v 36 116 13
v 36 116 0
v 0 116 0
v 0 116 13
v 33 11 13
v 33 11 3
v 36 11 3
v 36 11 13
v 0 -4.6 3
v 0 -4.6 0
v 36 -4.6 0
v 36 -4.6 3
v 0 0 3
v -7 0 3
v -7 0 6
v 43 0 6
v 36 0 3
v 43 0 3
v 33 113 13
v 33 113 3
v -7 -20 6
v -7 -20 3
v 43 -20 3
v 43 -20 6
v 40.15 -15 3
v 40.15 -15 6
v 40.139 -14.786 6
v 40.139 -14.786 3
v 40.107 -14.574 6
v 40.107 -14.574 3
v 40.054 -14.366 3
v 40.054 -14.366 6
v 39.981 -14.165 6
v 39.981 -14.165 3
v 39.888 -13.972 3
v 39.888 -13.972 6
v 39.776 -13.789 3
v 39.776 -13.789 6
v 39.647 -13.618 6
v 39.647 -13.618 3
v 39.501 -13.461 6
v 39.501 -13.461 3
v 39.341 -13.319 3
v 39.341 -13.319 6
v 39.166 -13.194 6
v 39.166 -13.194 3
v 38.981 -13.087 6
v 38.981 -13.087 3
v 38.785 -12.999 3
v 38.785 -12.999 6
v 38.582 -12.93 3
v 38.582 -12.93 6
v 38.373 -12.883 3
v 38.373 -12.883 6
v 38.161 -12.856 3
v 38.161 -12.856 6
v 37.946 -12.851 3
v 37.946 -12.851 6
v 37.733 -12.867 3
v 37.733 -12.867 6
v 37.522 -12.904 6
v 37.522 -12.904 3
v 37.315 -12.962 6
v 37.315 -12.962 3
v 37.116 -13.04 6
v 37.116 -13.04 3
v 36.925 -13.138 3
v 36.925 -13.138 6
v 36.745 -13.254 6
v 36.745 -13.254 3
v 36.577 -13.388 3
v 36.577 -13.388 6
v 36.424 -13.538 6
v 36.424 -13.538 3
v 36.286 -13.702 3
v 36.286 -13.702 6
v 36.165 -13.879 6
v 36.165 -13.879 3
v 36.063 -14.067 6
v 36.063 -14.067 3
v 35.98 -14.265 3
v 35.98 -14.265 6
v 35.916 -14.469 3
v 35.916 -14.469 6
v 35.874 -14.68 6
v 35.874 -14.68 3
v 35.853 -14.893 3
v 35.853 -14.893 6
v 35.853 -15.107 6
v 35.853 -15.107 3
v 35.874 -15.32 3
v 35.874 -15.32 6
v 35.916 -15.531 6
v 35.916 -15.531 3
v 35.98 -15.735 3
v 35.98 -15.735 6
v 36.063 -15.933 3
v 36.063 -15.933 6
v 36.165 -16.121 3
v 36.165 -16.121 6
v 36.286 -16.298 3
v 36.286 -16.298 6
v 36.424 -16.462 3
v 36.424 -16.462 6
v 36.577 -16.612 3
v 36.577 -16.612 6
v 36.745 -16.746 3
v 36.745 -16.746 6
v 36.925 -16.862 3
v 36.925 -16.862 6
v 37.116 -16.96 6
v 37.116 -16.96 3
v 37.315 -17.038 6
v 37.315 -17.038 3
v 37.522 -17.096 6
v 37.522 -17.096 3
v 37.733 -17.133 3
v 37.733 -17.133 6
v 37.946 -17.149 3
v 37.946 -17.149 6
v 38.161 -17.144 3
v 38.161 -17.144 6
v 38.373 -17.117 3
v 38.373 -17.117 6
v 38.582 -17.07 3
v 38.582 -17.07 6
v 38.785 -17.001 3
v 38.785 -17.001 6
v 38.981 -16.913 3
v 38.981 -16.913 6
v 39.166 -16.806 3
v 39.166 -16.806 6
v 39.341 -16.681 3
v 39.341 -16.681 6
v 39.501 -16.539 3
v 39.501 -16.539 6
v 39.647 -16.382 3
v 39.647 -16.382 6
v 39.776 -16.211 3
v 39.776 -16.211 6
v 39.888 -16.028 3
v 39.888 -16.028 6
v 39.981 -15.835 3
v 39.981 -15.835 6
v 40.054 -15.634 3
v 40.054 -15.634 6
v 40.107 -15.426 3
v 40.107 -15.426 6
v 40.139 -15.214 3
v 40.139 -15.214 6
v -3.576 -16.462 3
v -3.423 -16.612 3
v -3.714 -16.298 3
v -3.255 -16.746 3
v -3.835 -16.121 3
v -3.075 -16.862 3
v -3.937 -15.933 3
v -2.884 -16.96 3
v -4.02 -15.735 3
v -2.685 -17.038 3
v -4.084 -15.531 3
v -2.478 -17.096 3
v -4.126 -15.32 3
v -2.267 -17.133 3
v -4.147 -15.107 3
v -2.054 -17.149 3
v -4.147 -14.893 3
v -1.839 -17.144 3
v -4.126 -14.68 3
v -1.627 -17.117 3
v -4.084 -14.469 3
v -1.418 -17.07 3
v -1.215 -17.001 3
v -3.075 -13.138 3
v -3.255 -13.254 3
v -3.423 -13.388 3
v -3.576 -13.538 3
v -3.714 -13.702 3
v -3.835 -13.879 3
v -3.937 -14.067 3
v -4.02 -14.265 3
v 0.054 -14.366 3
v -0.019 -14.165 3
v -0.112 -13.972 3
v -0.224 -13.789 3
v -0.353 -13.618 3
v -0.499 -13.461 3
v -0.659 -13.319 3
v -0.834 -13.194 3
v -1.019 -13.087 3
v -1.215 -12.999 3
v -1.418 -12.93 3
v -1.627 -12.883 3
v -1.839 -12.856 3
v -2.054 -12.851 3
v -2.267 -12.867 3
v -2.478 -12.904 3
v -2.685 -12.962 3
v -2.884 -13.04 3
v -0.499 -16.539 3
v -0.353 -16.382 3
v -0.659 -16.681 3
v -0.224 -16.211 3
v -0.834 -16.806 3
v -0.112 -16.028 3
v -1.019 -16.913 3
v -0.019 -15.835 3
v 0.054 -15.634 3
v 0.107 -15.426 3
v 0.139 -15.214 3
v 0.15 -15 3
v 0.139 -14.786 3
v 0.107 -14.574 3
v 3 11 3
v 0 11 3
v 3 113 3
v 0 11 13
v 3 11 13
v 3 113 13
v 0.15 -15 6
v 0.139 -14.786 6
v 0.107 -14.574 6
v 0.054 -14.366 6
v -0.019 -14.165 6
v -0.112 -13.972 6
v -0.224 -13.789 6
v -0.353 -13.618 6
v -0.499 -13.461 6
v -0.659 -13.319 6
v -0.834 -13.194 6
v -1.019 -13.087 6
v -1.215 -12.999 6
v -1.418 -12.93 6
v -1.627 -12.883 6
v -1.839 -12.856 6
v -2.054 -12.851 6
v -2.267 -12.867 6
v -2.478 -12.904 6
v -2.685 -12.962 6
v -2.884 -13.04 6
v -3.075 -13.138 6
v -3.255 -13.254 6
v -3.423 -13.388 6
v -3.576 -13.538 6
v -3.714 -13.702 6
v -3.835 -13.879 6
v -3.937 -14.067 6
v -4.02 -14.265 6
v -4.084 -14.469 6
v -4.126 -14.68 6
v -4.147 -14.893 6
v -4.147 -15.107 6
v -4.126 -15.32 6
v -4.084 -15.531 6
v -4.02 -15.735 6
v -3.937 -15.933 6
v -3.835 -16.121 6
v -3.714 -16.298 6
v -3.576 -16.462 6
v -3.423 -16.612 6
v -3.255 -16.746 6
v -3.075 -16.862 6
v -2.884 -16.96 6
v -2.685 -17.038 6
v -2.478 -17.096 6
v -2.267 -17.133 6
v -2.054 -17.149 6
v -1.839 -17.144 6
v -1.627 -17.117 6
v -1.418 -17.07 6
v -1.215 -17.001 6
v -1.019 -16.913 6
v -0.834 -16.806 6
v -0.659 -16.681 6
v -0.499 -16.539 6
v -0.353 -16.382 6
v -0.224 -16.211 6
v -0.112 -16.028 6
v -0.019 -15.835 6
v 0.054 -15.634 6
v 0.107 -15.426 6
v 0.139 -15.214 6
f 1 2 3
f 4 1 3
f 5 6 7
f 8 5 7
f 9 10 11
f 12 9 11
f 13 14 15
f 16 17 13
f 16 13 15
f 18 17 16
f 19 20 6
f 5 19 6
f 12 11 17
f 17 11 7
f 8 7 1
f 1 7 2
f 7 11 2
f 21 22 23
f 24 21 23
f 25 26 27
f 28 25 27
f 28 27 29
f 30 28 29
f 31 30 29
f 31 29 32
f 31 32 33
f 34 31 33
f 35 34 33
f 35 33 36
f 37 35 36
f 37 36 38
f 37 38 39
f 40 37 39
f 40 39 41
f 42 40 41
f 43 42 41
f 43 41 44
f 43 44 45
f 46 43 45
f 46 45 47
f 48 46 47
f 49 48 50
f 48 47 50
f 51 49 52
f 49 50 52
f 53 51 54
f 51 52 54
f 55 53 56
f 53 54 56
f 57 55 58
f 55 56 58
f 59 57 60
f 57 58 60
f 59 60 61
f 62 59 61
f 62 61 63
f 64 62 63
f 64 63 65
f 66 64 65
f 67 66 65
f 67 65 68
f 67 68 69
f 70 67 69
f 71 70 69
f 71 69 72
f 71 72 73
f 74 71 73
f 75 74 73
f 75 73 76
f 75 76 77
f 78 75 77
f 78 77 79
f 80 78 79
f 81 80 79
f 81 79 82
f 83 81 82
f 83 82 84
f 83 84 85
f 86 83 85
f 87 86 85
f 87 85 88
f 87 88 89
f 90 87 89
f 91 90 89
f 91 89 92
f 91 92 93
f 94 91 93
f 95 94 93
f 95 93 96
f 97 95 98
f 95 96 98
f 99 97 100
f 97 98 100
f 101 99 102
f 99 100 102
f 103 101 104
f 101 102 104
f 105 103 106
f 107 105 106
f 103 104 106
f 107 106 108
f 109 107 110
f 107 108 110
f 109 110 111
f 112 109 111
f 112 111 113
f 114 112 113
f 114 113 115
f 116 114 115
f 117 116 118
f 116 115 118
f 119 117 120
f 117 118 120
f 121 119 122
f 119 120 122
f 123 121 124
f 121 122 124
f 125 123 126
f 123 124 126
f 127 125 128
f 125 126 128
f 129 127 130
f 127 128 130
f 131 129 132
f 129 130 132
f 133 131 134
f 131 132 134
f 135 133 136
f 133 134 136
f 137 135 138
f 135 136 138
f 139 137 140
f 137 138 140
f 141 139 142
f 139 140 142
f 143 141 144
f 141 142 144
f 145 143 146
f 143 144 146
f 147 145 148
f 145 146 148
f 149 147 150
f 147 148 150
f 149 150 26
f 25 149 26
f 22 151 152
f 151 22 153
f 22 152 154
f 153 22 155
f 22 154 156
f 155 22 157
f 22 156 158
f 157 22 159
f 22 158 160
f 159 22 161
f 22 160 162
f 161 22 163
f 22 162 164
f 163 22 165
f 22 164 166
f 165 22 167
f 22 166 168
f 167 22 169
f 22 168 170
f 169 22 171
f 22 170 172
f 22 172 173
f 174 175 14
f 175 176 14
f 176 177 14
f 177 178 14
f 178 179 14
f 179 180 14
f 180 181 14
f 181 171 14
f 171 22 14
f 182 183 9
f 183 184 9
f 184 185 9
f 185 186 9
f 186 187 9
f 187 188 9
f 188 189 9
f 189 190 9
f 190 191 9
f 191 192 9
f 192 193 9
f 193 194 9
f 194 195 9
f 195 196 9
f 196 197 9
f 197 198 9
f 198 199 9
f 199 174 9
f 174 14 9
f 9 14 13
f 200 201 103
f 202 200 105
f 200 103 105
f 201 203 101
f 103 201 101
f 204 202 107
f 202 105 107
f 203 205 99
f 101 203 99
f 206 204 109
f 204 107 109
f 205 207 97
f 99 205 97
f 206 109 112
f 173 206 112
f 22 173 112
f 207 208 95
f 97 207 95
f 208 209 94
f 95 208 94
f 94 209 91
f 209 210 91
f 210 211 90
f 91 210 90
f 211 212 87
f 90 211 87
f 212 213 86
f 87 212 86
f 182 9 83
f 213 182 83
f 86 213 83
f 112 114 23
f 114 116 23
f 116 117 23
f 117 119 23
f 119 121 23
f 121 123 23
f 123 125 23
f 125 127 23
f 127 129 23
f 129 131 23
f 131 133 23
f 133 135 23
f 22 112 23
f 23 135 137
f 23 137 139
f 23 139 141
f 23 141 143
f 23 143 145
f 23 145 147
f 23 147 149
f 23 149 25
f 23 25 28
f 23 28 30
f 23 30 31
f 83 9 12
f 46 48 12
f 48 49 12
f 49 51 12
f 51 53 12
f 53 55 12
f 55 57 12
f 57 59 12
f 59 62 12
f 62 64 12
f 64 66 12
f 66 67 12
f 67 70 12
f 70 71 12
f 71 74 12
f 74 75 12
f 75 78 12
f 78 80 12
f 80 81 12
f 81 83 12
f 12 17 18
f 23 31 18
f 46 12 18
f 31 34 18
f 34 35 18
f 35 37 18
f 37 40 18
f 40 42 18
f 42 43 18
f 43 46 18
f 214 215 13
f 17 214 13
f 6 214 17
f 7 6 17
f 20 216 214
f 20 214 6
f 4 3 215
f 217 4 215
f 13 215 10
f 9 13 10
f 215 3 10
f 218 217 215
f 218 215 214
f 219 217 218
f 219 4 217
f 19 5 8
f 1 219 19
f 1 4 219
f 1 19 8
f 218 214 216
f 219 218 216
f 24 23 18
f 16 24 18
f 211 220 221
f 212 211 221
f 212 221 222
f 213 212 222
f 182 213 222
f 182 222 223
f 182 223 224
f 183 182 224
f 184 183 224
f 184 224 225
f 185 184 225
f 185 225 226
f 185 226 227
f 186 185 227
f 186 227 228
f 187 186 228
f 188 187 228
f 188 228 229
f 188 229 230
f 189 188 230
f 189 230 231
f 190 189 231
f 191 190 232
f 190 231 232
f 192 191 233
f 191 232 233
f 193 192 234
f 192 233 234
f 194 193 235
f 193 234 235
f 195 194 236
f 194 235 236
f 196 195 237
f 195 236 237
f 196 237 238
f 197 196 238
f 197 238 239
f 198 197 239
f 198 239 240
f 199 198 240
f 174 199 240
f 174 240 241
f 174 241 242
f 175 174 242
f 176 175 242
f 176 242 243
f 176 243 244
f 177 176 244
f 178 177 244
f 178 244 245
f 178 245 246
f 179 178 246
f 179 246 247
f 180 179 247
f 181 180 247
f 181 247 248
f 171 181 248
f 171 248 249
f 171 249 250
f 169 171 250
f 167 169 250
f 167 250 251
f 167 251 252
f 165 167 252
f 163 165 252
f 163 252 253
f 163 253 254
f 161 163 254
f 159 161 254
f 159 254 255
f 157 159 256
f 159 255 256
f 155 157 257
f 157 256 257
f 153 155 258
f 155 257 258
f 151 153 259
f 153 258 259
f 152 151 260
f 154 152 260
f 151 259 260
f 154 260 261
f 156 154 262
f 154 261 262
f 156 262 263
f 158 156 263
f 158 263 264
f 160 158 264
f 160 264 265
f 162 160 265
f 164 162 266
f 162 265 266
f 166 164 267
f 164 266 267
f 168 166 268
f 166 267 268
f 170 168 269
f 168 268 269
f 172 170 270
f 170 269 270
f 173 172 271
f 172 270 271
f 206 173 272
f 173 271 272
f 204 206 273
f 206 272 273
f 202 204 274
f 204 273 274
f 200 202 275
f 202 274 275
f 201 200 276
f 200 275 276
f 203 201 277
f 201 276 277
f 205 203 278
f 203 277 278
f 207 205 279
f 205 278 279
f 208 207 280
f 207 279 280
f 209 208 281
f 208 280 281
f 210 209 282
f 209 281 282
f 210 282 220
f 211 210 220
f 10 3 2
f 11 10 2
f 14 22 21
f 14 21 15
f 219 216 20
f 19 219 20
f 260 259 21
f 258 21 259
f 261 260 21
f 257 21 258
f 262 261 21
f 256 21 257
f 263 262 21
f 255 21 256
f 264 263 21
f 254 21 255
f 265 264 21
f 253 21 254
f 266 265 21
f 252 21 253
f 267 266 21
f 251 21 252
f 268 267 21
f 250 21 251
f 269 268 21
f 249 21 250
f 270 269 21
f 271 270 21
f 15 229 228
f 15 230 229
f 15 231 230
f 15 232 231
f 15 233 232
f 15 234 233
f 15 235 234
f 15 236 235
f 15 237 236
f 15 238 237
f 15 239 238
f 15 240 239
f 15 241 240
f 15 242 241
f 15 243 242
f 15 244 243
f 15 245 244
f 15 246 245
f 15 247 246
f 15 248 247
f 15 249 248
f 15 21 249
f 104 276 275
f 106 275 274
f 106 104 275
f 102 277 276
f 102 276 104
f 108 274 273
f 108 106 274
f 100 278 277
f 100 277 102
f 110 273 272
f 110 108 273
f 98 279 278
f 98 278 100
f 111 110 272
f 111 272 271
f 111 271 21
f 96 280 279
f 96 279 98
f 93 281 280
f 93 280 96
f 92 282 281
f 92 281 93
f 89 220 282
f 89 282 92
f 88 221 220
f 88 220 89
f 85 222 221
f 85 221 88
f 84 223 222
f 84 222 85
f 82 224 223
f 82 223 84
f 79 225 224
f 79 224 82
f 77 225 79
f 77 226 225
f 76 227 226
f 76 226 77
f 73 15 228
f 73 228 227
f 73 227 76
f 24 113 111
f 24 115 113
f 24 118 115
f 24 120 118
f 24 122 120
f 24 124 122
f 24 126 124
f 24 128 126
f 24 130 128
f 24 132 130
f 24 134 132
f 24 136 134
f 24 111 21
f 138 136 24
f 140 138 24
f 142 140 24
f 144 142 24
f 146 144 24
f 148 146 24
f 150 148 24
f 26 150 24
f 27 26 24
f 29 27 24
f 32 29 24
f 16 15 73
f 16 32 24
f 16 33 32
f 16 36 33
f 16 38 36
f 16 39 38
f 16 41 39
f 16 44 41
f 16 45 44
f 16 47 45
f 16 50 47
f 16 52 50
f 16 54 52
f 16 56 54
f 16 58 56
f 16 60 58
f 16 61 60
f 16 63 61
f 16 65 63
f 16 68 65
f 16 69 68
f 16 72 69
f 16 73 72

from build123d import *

# Parameters (mm, degrees)
PAD_DEPTH       = 3
PAD001_DEPTH    = 10
SKETCH002_W     = 50
SKETCH002_H     = 20
PAD002_DEPTH    = 3
SKETCH003_R     = 2.15
POCKET_DEPTH    = 5
SKETCH004_W     = 36
SKETCH004_H     = 15
POCKET001_DEPTH = 3
SKETCH005_W     = 36
SKETCH005_H     = 0.4
POCKET002_DEPTH = 3


with BuildPart() as part:
    # Sketch → Pad (new body)
    with BuildSketch(Plane.XY):
        Polygon((0, 116), (0, 0), (0, -20), (36, -20), (36, 0), (36, 116), align=None)
    extrude(amount=PAD_DEPTH)

    # Sketch001 (on Face4 of Pad) → Pad001 (join)
    with BuildSketch(Plane.XY.offset(3)):
        Polygon((0, 11), (3, 11), (3, 113), (33, 113), (33, 11), (36, 11), (36, 116), (0, 116), align=None)
    extrude(amount=PAD001_DEPTH)

    # Sketch002 (on Face3 of Pad001) → Pad002 (join)
    with BuildSketch(Plane.XY.offset(3)):
        with Locations((18, -10)):
            Rectangle(SKETCH002_W, SKETCH002_H)
    extrude(amount=PAD002_DEPTH)

    # Sketch003 (on Face13 of Pad002) → Pocket (cut)
    with BuildSketch(Plane.XY.offset(6)):
        with Locations((-2, -15)):
            Circle(SKETCH003_R)
        with Locations((38, -15)):
            Circle(SKETCH003_R)
    extrude(amount=-POCKET_DEPTH, mode=Mode.SUBTRACT)

    # Sketch004 (on Face10 of Pocket) → Pocket001 (cut)
    with BuildSketch(Plane(origin=(0, 0, 0), x_dir=(1, 0, 0), z_dir=(0, 0, -1))):
        with Locations((18, 12.5)):
            Rectangle(SKETCH004_W, SKETCH004_H)
    extrude(amount=-POCKET001_DEPTH, mode=Mode.SUBTRACT)

    # Sketch005 (on Face7 of Pocket001) → Pocket002 (cut)
    with BuildSketch(Plane(origin=(0, 0, 0), x_dir=(1, 0, 0), z_dir=(0, 0, -1))):
        with Locations((18, 4.8)):
            Rectangle(SKETCH005_W, SKETCH005_H)
    extrude(amount=-POCKET002_DEPTH, mode=Mode.SUBTRACT)


solid = part.part
